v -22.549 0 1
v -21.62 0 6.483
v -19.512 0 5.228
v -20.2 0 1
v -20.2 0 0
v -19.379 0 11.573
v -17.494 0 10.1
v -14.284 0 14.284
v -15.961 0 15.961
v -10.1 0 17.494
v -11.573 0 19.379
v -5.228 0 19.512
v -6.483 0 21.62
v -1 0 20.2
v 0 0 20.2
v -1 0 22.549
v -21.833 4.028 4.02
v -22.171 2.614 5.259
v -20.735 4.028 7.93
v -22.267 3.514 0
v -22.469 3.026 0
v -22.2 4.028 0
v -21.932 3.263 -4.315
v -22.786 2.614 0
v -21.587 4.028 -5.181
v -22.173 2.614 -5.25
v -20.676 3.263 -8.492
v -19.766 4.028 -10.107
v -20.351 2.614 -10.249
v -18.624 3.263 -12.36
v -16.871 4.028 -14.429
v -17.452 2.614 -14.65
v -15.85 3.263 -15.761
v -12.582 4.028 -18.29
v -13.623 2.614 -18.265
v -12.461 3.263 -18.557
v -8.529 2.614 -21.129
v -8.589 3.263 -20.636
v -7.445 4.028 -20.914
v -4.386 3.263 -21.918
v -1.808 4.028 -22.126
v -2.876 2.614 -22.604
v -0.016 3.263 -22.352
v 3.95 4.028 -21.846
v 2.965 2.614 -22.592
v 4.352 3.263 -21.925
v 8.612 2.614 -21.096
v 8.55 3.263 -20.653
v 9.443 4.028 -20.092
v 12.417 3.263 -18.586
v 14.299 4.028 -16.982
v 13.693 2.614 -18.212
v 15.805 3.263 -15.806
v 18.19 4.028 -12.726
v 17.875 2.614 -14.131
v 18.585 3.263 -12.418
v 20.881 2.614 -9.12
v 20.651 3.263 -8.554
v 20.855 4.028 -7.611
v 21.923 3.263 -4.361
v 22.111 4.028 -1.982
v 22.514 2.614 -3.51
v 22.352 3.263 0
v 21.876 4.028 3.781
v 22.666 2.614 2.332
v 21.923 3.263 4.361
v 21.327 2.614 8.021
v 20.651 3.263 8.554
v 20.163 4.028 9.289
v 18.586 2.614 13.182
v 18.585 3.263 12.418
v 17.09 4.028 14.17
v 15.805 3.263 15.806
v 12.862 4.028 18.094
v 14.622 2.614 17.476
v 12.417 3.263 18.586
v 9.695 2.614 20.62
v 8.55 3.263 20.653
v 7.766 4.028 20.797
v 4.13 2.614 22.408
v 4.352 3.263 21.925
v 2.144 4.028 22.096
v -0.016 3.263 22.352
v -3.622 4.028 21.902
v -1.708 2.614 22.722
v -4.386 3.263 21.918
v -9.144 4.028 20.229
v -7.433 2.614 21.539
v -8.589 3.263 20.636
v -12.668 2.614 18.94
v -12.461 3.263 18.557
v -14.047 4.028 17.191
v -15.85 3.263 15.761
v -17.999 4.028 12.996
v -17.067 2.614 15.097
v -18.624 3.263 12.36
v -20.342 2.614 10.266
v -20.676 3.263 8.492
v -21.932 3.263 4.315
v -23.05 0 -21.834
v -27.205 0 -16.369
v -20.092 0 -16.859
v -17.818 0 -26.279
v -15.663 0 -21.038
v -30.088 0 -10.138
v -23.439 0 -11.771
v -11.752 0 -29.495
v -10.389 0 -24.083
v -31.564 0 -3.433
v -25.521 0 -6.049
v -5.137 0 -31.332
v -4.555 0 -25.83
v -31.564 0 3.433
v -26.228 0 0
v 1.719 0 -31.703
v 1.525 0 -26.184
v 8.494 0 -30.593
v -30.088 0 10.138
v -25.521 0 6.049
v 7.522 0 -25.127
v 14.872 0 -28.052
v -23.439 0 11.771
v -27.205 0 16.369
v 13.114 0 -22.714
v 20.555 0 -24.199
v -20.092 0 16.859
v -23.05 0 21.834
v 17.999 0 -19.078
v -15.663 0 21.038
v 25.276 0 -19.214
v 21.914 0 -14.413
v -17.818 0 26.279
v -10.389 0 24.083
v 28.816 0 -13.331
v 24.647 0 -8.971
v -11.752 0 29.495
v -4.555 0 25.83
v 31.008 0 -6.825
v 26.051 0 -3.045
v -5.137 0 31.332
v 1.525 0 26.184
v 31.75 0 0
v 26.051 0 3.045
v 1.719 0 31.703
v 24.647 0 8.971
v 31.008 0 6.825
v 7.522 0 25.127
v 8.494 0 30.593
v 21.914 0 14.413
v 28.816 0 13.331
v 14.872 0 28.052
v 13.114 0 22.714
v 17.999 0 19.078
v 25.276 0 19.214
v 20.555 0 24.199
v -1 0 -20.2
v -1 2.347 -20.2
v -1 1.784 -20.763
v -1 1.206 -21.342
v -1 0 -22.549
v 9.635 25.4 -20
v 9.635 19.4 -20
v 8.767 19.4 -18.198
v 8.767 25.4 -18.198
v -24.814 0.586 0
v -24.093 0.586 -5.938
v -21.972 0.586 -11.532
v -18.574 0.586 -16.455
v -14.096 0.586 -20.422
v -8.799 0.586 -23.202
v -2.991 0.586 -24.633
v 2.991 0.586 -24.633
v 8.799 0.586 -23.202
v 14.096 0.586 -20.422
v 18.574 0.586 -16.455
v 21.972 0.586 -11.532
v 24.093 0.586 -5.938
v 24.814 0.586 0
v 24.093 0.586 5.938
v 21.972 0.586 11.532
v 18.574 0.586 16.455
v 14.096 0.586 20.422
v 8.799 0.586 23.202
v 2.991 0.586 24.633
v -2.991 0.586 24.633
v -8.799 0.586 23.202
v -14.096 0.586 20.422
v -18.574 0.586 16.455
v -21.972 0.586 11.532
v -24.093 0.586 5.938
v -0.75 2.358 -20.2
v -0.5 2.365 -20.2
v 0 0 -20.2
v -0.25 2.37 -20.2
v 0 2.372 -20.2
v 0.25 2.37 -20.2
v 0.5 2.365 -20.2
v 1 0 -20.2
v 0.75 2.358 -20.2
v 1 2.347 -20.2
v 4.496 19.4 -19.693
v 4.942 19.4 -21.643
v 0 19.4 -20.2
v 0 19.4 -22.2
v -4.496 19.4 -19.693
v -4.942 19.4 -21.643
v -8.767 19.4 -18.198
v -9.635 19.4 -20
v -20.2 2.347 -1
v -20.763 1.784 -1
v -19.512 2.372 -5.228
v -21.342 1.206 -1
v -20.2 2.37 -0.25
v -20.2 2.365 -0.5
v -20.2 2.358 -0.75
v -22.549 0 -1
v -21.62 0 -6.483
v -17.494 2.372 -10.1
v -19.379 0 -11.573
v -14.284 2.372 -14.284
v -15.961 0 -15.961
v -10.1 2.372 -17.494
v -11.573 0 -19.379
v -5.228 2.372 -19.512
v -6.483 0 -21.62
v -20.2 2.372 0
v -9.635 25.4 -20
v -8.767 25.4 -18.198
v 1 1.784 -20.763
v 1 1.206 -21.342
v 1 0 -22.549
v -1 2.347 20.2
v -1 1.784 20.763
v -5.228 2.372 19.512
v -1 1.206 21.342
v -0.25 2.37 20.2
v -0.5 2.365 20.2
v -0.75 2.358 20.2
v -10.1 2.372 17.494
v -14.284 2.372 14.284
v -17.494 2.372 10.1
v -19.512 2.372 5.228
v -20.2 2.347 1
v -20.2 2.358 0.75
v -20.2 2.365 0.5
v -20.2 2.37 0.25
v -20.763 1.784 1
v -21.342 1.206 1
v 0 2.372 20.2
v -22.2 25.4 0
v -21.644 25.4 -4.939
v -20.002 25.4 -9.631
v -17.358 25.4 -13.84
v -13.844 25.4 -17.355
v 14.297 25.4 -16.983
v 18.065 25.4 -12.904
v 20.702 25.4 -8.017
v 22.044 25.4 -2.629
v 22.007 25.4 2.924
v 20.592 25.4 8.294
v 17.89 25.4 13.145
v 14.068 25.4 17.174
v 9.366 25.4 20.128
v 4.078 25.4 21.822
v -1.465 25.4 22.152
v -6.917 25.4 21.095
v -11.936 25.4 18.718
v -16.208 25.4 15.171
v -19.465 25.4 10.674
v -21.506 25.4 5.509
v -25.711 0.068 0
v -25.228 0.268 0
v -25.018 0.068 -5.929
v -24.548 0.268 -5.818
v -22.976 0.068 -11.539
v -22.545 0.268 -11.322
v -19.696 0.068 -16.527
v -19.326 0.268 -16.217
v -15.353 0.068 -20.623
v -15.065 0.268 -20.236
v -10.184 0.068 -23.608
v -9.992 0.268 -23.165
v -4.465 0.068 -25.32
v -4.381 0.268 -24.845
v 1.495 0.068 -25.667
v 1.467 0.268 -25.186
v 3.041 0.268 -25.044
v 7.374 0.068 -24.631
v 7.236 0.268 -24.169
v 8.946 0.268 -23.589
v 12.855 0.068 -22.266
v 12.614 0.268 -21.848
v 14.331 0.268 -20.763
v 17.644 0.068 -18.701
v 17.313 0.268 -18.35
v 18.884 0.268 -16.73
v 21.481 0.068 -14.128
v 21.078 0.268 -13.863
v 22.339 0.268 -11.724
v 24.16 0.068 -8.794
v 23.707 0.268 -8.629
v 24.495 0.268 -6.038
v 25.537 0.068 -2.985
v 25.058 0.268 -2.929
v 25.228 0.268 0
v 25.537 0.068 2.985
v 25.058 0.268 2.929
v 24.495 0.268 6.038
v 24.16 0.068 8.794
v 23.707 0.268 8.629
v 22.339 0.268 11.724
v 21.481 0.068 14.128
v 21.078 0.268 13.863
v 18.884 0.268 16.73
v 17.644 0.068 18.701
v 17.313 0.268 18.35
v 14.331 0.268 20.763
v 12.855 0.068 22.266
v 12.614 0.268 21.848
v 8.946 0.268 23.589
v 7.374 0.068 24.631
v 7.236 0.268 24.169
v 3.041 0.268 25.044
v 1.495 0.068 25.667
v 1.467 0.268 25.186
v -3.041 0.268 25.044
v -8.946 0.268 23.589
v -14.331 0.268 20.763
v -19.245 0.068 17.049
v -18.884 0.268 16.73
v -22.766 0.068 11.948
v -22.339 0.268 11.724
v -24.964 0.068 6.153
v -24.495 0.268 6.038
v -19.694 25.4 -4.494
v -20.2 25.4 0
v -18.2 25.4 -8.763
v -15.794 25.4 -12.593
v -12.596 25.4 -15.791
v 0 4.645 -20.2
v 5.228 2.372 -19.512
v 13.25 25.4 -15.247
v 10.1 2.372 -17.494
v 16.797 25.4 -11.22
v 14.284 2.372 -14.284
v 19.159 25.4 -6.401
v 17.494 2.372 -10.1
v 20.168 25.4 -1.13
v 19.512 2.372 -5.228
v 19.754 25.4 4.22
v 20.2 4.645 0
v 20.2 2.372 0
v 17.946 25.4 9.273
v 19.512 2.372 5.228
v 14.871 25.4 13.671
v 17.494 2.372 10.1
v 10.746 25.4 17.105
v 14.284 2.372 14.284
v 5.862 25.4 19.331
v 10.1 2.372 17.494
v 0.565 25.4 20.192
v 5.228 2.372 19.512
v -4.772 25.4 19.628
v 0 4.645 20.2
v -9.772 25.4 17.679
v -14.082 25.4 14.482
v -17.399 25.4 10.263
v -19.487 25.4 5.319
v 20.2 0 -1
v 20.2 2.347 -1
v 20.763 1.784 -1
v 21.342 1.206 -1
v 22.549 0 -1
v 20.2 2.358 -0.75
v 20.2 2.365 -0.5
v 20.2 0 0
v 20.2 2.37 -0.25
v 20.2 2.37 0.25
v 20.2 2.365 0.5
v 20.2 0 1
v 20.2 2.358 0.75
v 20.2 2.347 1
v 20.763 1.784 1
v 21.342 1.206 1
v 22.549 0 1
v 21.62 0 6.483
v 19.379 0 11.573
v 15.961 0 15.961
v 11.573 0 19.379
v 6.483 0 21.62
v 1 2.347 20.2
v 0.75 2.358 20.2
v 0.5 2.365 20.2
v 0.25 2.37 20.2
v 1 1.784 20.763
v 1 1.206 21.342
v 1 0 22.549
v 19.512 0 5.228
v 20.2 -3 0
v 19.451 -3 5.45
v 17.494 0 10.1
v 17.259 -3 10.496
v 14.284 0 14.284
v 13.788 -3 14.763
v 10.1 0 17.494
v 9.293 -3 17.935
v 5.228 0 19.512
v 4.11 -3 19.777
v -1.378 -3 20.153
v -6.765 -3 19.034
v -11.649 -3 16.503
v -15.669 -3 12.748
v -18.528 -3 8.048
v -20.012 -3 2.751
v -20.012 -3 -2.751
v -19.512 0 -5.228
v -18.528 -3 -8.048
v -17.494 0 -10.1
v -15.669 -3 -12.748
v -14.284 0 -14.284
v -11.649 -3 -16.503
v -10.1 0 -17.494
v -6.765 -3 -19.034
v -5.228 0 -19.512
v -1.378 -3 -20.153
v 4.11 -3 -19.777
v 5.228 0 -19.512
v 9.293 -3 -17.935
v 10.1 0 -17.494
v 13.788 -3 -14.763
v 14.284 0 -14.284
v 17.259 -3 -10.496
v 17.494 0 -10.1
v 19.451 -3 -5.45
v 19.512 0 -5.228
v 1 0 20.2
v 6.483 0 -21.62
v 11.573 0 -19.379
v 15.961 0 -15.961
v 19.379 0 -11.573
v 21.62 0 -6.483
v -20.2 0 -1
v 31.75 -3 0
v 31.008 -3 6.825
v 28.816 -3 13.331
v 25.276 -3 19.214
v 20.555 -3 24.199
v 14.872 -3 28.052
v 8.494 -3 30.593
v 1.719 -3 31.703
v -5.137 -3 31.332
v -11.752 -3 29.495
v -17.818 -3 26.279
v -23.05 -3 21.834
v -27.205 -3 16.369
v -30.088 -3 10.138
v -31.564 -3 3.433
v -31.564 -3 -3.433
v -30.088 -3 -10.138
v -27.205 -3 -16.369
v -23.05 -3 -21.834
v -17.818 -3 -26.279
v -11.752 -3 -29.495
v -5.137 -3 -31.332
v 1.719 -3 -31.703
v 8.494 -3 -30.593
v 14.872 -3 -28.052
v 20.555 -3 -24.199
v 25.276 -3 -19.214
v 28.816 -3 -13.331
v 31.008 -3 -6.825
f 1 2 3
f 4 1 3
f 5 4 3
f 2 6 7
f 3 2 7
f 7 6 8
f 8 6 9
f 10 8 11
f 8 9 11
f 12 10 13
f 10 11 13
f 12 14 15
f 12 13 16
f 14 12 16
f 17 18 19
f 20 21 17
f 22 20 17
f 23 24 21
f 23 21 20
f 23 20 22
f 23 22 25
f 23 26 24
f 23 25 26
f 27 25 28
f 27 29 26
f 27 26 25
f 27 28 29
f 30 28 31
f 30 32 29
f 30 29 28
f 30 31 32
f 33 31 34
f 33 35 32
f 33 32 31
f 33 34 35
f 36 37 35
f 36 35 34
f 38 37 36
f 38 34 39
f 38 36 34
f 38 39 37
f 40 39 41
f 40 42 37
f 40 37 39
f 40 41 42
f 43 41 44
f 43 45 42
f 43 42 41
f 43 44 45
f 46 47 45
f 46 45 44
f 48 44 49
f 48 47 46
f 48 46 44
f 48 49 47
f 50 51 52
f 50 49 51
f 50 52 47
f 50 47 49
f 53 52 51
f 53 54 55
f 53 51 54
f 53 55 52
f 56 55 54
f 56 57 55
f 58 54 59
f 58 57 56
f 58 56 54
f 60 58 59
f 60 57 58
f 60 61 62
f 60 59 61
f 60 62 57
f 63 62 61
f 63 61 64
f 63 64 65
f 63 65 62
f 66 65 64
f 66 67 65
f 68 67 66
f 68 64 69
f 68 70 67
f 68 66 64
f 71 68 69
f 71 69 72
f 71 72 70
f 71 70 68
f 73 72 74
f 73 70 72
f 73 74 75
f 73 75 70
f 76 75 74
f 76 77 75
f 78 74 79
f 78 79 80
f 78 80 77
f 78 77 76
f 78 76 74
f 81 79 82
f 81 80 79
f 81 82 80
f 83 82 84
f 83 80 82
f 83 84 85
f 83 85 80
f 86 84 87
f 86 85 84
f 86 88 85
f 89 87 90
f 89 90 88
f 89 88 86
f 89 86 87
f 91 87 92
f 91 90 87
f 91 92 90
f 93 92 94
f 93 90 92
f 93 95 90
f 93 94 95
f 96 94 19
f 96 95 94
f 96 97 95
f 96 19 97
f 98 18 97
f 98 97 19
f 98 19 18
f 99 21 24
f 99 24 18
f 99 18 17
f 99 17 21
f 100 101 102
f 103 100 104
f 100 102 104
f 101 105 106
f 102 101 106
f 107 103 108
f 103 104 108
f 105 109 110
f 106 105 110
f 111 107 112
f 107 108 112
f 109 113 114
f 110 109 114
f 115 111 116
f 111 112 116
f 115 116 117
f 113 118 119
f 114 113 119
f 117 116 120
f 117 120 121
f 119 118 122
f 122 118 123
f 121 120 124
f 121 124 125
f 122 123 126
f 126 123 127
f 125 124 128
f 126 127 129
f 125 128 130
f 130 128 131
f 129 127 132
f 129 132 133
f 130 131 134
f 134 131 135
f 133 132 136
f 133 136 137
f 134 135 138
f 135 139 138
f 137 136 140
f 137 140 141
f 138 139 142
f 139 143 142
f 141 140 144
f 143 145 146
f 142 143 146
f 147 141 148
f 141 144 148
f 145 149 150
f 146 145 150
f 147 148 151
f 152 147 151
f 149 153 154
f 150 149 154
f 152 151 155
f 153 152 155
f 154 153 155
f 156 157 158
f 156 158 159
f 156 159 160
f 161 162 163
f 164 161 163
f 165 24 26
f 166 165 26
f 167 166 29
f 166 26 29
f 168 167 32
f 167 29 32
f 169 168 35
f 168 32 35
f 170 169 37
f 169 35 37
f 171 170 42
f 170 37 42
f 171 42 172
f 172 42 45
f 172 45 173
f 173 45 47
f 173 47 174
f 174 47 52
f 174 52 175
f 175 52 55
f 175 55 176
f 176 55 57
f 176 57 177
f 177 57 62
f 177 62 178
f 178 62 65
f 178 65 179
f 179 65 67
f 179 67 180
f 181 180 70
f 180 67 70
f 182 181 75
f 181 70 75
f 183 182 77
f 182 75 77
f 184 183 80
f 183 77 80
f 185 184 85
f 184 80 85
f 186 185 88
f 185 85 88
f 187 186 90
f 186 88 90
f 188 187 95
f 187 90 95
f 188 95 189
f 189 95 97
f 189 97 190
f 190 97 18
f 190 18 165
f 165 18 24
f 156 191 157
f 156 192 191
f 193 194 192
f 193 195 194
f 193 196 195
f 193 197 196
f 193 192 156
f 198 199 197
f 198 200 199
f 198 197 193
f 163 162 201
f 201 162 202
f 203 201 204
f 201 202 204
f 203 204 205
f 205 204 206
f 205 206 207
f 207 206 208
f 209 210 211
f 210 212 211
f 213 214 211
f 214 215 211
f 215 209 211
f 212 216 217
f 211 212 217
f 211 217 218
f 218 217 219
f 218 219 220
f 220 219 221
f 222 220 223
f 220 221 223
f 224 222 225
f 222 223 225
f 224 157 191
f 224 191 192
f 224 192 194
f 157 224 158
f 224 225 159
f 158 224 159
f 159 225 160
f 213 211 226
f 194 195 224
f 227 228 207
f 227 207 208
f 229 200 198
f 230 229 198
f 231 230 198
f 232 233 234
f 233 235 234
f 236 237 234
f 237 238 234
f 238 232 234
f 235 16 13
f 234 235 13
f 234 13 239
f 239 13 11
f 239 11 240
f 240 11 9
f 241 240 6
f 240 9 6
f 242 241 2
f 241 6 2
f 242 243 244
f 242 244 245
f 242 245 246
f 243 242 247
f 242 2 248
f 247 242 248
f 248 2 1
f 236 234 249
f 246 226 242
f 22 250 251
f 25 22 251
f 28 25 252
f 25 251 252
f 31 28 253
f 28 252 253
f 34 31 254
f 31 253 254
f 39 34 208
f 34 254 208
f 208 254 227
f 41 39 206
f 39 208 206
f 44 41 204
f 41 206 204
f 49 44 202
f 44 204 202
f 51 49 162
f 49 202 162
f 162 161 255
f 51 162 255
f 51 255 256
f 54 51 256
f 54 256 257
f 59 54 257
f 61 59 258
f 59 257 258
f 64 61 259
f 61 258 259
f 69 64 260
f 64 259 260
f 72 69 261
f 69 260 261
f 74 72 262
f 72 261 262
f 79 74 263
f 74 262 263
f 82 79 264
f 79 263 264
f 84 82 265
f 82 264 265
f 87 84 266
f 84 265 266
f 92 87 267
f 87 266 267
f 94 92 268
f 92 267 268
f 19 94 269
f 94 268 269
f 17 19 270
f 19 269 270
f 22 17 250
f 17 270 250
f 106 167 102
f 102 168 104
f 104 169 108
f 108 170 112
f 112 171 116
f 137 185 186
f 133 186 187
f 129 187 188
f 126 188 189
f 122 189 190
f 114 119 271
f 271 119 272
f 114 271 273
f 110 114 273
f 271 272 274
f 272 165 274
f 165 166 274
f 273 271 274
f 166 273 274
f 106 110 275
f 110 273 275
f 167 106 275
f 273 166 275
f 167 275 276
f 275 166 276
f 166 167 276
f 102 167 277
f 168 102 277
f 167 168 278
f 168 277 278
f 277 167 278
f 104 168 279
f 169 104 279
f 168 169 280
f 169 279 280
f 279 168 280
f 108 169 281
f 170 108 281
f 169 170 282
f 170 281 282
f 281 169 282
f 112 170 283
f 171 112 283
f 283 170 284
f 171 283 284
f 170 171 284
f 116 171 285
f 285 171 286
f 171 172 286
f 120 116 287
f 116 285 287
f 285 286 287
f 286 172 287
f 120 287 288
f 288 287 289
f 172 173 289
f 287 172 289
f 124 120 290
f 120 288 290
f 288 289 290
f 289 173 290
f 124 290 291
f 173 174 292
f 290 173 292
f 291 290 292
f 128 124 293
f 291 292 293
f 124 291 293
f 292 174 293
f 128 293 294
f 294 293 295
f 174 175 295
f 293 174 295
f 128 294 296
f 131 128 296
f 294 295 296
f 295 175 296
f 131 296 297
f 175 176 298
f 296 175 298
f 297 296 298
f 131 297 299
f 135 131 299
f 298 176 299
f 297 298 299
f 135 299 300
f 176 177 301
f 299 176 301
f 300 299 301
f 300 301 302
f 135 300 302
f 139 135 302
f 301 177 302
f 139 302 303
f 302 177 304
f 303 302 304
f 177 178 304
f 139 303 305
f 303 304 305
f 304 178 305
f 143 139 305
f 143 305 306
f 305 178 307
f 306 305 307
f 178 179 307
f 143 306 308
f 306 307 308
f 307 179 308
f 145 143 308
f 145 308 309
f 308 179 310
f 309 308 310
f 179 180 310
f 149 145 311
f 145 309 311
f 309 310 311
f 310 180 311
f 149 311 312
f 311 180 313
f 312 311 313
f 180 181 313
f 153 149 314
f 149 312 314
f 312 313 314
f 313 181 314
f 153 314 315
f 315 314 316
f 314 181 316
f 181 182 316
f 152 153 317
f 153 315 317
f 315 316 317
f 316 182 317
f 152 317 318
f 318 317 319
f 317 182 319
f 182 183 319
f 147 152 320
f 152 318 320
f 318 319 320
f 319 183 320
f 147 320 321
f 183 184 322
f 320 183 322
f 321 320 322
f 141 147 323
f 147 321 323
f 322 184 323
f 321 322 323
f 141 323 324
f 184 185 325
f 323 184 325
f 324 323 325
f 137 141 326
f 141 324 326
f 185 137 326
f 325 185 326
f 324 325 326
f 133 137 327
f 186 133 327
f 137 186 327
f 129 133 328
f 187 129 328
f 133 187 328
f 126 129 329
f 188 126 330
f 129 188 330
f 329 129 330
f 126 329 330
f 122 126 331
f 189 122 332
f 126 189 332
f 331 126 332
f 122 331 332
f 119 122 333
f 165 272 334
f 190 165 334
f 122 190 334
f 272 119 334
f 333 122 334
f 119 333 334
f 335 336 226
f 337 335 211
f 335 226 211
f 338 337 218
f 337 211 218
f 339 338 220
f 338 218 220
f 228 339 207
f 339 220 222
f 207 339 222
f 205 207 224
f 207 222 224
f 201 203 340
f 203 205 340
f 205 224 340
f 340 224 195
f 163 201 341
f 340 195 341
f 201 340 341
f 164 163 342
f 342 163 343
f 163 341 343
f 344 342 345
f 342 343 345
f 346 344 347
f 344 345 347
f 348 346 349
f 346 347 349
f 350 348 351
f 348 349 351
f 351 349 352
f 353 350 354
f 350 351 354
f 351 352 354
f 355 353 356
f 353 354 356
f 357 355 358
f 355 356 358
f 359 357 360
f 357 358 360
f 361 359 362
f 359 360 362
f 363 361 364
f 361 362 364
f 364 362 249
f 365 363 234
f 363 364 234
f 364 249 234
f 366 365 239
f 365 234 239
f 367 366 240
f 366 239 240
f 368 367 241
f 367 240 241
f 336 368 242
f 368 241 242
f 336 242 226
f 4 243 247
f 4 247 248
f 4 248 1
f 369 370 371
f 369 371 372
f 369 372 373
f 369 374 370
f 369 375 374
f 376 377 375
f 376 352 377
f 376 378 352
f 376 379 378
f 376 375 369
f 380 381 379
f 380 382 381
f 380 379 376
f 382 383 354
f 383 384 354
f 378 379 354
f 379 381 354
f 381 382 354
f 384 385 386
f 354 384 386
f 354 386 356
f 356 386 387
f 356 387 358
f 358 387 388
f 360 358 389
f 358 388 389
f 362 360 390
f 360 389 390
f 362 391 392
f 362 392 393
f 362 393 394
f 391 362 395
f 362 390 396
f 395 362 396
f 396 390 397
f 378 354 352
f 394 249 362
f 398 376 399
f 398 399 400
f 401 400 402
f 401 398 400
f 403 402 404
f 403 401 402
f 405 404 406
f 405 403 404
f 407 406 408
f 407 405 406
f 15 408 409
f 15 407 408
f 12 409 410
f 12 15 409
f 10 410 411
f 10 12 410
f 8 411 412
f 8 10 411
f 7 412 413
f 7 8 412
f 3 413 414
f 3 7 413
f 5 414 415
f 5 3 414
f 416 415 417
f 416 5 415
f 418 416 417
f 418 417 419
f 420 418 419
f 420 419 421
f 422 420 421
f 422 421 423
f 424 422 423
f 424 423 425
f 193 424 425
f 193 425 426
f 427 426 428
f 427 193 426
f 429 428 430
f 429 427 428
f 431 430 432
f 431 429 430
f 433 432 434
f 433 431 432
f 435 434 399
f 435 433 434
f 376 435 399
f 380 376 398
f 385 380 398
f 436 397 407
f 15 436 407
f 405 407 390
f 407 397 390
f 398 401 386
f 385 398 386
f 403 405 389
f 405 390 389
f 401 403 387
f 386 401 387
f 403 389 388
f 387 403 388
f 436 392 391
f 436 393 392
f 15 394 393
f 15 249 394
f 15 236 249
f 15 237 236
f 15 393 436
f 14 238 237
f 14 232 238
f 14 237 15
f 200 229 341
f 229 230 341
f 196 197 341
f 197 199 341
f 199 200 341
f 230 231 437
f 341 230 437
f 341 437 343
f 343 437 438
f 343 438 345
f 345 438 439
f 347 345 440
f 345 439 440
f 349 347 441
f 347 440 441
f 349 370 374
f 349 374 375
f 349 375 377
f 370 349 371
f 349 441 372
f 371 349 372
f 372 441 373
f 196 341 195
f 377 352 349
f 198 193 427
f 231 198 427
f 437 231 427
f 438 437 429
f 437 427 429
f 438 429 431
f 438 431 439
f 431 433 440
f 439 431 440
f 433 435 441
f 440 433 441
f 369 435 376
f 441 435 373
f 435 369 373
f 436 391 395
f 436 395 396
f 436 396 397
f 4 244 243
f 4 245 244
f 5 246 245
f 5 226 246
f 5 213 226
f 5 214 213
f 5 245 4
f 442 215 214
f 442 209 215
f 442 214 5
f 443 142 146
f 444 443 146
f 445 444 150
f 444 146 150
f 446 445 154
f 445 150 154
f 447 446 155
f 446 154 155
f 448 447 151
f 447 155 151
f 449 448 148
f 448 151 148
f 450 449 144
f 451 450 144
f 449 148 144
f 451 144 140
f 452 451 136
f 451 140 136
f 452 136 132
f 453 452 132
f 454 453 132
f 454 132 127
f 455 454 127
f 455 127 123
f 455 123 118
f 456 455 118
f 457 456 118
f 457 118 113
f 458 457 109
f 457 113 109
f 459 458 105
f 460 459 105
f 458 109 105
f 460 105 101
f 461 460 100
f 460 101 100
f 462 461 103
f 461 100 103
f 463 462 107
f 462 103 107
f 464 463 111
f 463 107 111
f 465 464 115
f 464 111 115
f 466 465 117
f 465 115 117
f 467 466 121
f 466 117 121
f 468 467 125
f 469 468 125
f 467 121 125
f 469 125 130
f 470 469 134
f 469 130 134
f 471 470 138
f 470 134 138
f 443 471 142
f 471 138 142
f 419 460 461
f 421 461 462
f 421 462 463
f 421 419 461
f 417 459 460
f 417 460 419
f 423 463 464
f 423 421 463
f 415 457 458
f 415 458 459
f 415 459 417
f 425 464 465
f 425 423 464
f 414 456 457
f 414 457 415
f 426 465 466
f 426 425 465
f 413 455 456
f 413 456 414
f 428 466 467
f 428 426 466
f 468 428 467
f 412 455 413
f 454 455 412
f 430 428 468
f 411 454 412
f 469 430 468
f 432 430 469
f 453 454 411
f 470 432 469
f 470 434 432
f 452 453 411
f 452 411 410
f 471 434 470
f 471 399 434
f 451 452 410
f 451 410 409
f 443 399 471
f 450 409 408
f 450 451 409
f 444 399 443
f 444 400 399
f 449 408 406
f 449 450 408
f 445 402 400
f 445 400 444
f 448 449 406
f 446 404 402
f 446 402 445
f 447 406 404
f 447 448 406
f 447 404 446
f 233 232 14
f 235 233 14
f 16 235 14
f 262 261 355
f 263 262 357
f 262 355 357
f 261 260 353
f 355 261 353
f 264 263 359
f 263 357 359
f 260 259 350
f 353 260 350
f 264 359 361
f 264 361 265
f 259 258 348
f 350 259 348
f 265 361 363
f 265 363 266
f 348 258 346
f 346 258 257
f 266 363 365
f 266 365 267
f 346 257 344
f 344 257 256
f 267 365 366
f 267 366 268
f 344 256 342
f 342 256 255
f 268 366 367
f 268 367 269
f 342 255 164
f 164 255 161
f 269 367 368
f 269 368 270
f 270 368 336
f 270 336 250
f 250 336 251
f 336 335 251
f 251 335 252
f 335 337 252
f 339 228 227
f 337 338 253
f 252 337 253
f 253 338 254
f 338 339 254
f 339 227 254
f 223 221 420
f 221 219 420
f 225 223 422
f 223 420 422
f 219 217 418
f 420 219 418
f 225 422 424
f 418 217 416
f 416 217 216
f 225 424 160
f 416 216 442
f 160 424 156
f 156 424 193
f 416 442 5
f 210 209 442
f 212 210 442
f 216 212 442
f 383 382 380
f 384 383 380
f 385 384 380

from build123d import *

# Parameters (mm, degrees)
SKETCH4_R           = 31.75
SKETCH4_R_2         = 20.2
BOSS_EXTRUDE1_DEPTH = 3
FILLET1_R           = 2
FILLET2_R           = 2
BOSS_EXTRUDE2_DEPTH = 1
CIRPATTERN1_COUNT   = 4
CUT_EXTRUDE1_DEPTH  = 6
CUT_EXTRUDE2_DEPTH  = 6


with BuildPart() as part:
    # Sketch3 → Revolve1 (revolve)
    with BuildSketch(Plane.XY):
        Polygon((-20.2, 25.4), (-22.2, 25.4), (-22.2, 3.2), (-25.4, 0), (-22.571572875, 0), (-20.2, 2.371572875), align=None)
    revolve(axis=Axis((0, 25.4, 0), (0, -1, 0)))

    # Sketch4 → Boss-Extrude1 (add)
    with BuildSketch(Plane.XZ):
        Circle(SKETCH4_R)
        Circle(SKETCH4_R_2, mode=Mode.SUBTRACT)
    extrude(amount=BOSS_EXTRUDE1_DEPTH)

    # Fillet1
    fillet1_edges = [part.edges().sort_by_distance(p)[0] for p in [
        (25.4, 0, 0),
    ]]
    fillet(fillet1_edges, radius=FILLET1_R)

    # Fillet2
    fillet2_edges = [part.edges().sort_by_distance(p)[0] for p in [
        (22.2, 3.2, 0),
    ]]
    fillet(fillet2_edges, radius=FILLET2_R)

    # Sketch5 → Boss-Extrude2 (add, symmetric)
    with BuildSketch(Plane.XY):
        Polygon((20.2, 0), (23.444013634, 0), (23.444013634, 1.439043573), (20.2, 4.645223745), align=None)
    boss_extrude2 = extrude(amount=BOSS_EXTRUDE2_DEPTH, both=True)

    # CirPattern1: Boss-Extrude2 ×4 about axis
    cirpattern1_axis = Axis((0, 25.4, 0), (0, 1, 0))
    for i in range(1, CIRPATTERN1_COUNT):
        add(boss_extrude2.rotate(cirpattern1_axis, i * 360 / CIRPATTERN1_COUNT))

    # Sketch6 → Cut-Extrude1 (cut)
    with BuildSketch(Plane(origin=(0, 25.4, 0), x_dir=(1, 0, 0), z_dir=(0, 1, 0))):
        with BuildLine():
            Line((0, 20), (-13.834891336, 20))
            ThreePointArc((-13.834891336, 20), (0, 24.318803801), (13.834891336, 20))
            Line((13.834891336, 20), (0, 20))
        make_face()
    extrude(amount=-CUT_EXTRUDE1_DEPTH, mode=Mode.SUBTRACT)

    # Sketch7 → Cut-Extrude2 (cut)
    with BuildSketch(Plane(origin=(0, 25.4, 0), x_dir=(1, 0, 0), z_dir=(0, 1, 0))):
        Polygon((-9.635351576, 20), (2.835489376, 20), (9.635351576, 20), (7.753188698, 16.093213904), (-7.753188698, 16.093213904), align=None)
    extrude(amount=-CUT_EXTRUDE2_DEPTH, mode=Mode.SUBTRACT)


solid = part.part
